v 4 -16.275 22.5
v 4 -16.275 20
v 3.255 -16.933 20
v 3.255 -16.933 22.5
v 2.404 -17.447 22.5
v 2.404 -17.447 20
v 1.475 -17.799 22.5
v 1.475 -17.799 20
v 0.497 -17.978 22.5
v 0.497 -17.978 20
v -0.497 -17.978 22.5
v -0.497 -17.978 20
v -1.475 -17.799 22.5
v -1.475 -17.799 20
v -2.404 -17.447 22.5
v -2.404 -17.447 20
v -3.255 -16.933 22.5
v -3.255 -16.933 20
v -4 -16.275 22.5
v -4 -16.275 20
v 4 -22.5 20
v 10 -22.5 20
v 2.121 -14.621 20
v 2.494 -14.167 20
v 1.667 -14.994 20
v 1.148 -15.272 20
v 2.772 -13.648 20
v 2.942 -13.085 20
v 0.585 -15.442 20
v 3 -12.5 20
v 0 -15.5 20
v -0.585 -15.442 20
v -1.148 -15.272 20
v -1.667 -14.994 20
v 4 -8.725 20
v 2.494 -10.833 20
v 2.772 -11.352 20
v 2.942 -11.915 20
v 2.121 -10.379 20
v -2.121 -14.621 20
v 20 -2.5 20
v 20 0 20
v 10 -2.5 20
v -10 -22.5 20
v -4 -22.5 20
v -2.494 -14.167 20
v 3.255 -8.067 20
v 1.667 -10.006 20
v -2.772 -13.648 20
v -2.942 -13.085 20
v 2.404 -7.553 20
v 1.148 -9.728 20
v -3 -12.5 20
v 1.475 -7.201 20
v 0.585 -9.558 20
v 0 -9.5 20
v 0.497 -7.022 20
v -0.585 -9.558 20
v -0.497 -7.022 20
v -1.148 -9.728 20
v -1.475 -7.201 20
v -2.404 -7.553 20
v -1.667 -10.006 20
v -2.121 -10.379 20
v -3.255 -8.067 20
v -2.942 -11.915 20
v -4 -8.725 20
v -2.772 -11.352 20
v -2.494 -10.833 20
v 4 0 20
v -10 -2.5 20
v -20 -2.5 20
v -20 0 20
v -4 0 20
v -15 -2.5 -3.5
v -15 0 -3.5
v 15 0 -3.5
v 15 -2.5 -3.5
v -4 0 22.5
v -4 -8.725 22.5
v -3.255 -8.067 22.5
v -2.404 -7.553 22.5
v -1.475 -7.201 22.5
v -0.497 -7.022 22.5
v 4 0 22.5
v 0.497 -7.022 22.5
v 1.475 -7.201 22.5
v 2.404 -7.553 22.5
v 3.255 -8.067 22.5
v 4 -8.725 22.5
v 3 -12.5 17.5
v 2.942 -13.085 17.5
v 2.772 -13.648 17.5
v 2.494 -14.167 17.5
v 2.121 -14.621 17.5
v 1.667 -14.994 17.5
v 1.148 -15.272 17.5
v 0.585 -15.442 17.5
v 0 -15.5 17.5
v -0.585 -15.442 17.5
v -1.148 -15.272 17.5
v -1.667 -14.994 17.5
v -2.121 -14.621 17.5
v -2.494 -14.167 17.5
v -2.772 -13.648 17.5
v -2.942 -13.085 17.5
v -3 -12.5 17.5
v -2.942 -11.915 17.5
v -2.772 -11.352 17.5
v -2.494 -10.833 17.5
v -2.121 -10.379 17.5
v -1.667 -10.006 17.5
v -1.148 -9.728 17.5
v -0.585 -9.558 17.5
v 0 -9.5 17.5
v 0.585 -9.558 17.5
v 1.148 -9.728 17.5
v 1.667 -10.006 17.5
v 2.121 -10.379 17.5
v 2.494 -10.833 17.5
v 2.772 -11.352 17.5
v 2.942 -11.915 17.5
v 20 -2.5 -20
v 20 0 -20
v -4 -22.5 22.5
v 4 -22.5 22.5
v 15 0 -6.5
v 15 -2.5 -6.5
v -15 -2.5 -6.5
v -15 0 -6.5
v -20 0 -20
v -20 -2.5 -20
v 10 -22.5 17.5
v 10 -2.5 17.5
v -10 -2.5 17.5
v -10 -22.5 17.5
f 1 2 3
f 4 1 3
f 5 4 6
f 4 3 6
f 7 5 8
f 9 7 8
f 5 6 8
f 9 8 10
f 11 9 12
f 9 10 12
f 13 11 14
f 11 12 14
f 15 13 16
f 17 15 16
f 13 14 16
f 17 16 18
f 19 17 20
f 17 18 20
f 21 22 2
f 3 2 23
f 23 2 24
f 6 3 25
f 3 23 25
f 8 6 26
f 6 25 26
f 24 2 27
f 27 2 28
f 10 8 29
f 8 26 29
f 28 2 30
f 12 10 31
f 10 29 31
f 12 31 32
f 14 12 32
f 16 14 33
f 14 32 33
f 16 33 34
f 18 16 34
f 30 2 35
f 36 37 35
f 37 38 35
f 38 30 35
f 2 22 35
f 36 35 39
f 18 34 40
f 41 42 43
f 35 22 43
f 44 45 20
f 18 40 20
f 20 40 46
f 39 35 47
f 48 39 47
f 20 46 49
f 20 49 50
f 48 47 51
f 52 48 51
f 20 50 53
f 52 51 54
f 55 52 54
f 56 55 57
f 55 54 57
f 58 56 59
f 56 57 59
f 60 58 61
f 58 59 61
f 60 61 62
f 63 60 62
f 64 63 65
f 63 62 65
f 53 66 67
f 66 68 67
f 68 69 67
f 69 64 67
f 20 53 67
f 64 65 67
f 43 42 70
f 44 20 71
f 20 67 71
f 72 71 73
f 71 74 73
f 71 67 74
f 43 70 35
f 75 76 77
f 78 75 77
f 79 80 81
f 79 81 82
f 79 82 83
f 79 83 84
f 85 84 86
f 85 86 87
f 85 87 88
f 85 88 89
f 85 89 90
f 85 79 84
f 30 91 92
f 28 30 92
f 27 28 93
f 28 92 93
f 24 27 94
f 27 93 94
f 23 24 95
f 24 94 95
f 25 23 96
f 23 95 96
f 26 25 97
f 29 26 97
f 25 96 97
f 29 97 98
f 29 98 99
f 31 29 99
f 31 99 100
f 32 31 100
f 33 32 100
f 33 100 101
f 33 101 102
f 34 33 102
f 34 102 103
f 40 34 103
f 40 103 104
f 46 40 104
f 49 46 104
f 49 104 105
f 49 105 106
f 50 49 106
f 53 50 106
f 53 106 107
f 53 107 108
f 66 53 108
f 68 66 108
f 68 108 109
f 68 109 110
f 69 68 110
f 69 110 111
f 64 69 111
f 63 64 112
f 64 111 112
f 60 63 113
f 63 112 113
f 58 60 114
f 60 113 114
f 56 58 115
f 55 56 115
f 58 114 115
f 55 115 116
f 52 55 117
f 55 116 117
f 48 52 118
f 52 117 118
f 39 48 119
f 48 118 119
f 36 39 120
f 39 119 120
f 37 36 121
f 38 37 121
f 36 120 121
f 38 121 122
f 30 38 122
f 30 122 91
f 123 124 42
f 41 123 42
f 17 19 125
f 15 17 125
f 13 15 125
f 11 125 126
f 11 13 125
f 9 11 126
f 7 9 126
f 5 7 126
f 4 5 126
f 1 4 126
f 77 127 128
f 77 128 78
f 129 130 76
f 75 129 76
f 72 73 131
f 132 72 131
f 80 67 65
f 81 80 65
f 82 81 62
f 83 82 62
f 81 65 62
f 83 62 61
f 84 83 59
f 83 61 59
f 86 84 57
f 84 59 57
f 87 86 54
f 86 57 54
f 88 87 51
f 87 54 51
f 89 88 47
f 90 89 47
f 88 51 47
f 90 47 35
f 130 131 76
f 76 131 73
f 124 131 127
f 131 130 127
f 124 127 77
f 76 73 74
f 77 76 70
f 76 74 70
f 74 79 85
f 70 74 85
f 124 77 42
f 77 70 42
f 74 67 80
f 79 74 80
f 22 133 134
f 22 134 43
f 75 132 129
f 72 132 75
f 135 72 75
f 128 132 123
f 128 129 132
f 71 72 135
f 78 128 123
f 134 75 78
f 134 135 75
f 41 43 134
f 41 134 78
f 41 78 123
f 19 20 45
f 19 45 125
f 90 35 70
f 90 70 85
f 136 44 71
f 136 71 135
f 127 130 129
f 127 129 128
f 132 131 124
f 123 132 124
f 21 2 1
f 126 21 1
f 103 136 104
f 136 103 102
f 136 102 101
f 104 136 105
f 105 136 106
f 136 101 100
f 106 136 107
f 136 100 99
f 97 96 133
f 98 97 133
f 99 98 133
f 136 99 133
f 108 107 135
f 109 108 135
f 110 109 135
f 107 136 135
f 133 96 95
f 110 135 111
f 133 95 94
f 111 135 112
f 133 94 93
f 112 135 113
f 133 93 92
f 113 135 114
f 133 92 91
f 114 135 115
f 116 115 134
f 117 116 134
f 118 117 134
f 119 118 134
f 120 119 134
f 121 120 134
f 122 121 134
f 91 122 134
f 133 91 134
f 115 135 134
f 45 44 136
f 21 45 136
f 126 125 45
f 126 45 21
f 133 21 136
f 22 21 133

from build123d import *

# Parameters (mm, degrees)
F0_W     = 30
F0_H     = 3
F1_DEPTH = 2.5
F2_DEPTH = 22.5
F0_W_2   = 8
F0_H_2   = 2.5
F3_DEPTH = 22.5
F4_R     = 3
F5_DEPTH = 5.001
F6_START = -2.5
F4_R_2   = 5.5
F6_DEPTH = 2.5


with BuildPart() as f1:
    # F0 (on Front) → F1 (new body)
    with BuildSketch(Plane.XZ):
        Polygon((-20, -20), (20, -20), (20, 17.5), (20, 20), (10, 20), (10, 17.5), (0, 17.5), (-10, 17.5), (-10, 20), (-20, 20), (-20, 17.5), align=None)
        with Locations((0, -5)):
            Rectangle(F0_W, F0_H, mode=Mode.SUBTRACT)
    extrude(amount=F1_DEPTH)

    # F0 (on Front) → F2 (join)
    with BuildSketch(Plane.XZ):
        Polygon((10, 17.5), (10, 20), (4, 20), (-4, 20), (-10, 20), (-10, 17.5), (0, 17.5), align=None)
    extrude(amount=F2_DEPTH)

    # F0 (on Front) → F3 (join)
    with BuildSketch(Plane.XZ):
        with Locations((0, 21.25)):
            Rectangle(F0_W_2, F0_H_2)
    extrude(amount=F3_DEPTH)

    # F4 (on face) → F5 (cut, through all)
    with BuildSketch(Plane(origin=(0, 0, 17.5), x_dir=(1, 0, 0), z_dir=(0, 0, -1))):
        with Locations((0, 12.5)):
            Circle(F4_R)
    extrude(amount=-F5_DEPTH, mode=Mode.SUBTRACT)

    # F4 (on face) → F6 (cut)
    with BuildSketch(Plane(origin=(0, 0, 17.5), x_dir=(1, 0, 0), z_dir=(0, 0, -1)).offset(F6_START)):
        with Locations((0, 12.5)):
            Circle(F4_R_2)
        with Locations((0, 12.5)):
            Circle(F4_R, mode=Mode.SUBTRACT)
    extrude(amount=-F6_DEPTH, mode=Mode.SUBTRACT)


solid = f1.part
